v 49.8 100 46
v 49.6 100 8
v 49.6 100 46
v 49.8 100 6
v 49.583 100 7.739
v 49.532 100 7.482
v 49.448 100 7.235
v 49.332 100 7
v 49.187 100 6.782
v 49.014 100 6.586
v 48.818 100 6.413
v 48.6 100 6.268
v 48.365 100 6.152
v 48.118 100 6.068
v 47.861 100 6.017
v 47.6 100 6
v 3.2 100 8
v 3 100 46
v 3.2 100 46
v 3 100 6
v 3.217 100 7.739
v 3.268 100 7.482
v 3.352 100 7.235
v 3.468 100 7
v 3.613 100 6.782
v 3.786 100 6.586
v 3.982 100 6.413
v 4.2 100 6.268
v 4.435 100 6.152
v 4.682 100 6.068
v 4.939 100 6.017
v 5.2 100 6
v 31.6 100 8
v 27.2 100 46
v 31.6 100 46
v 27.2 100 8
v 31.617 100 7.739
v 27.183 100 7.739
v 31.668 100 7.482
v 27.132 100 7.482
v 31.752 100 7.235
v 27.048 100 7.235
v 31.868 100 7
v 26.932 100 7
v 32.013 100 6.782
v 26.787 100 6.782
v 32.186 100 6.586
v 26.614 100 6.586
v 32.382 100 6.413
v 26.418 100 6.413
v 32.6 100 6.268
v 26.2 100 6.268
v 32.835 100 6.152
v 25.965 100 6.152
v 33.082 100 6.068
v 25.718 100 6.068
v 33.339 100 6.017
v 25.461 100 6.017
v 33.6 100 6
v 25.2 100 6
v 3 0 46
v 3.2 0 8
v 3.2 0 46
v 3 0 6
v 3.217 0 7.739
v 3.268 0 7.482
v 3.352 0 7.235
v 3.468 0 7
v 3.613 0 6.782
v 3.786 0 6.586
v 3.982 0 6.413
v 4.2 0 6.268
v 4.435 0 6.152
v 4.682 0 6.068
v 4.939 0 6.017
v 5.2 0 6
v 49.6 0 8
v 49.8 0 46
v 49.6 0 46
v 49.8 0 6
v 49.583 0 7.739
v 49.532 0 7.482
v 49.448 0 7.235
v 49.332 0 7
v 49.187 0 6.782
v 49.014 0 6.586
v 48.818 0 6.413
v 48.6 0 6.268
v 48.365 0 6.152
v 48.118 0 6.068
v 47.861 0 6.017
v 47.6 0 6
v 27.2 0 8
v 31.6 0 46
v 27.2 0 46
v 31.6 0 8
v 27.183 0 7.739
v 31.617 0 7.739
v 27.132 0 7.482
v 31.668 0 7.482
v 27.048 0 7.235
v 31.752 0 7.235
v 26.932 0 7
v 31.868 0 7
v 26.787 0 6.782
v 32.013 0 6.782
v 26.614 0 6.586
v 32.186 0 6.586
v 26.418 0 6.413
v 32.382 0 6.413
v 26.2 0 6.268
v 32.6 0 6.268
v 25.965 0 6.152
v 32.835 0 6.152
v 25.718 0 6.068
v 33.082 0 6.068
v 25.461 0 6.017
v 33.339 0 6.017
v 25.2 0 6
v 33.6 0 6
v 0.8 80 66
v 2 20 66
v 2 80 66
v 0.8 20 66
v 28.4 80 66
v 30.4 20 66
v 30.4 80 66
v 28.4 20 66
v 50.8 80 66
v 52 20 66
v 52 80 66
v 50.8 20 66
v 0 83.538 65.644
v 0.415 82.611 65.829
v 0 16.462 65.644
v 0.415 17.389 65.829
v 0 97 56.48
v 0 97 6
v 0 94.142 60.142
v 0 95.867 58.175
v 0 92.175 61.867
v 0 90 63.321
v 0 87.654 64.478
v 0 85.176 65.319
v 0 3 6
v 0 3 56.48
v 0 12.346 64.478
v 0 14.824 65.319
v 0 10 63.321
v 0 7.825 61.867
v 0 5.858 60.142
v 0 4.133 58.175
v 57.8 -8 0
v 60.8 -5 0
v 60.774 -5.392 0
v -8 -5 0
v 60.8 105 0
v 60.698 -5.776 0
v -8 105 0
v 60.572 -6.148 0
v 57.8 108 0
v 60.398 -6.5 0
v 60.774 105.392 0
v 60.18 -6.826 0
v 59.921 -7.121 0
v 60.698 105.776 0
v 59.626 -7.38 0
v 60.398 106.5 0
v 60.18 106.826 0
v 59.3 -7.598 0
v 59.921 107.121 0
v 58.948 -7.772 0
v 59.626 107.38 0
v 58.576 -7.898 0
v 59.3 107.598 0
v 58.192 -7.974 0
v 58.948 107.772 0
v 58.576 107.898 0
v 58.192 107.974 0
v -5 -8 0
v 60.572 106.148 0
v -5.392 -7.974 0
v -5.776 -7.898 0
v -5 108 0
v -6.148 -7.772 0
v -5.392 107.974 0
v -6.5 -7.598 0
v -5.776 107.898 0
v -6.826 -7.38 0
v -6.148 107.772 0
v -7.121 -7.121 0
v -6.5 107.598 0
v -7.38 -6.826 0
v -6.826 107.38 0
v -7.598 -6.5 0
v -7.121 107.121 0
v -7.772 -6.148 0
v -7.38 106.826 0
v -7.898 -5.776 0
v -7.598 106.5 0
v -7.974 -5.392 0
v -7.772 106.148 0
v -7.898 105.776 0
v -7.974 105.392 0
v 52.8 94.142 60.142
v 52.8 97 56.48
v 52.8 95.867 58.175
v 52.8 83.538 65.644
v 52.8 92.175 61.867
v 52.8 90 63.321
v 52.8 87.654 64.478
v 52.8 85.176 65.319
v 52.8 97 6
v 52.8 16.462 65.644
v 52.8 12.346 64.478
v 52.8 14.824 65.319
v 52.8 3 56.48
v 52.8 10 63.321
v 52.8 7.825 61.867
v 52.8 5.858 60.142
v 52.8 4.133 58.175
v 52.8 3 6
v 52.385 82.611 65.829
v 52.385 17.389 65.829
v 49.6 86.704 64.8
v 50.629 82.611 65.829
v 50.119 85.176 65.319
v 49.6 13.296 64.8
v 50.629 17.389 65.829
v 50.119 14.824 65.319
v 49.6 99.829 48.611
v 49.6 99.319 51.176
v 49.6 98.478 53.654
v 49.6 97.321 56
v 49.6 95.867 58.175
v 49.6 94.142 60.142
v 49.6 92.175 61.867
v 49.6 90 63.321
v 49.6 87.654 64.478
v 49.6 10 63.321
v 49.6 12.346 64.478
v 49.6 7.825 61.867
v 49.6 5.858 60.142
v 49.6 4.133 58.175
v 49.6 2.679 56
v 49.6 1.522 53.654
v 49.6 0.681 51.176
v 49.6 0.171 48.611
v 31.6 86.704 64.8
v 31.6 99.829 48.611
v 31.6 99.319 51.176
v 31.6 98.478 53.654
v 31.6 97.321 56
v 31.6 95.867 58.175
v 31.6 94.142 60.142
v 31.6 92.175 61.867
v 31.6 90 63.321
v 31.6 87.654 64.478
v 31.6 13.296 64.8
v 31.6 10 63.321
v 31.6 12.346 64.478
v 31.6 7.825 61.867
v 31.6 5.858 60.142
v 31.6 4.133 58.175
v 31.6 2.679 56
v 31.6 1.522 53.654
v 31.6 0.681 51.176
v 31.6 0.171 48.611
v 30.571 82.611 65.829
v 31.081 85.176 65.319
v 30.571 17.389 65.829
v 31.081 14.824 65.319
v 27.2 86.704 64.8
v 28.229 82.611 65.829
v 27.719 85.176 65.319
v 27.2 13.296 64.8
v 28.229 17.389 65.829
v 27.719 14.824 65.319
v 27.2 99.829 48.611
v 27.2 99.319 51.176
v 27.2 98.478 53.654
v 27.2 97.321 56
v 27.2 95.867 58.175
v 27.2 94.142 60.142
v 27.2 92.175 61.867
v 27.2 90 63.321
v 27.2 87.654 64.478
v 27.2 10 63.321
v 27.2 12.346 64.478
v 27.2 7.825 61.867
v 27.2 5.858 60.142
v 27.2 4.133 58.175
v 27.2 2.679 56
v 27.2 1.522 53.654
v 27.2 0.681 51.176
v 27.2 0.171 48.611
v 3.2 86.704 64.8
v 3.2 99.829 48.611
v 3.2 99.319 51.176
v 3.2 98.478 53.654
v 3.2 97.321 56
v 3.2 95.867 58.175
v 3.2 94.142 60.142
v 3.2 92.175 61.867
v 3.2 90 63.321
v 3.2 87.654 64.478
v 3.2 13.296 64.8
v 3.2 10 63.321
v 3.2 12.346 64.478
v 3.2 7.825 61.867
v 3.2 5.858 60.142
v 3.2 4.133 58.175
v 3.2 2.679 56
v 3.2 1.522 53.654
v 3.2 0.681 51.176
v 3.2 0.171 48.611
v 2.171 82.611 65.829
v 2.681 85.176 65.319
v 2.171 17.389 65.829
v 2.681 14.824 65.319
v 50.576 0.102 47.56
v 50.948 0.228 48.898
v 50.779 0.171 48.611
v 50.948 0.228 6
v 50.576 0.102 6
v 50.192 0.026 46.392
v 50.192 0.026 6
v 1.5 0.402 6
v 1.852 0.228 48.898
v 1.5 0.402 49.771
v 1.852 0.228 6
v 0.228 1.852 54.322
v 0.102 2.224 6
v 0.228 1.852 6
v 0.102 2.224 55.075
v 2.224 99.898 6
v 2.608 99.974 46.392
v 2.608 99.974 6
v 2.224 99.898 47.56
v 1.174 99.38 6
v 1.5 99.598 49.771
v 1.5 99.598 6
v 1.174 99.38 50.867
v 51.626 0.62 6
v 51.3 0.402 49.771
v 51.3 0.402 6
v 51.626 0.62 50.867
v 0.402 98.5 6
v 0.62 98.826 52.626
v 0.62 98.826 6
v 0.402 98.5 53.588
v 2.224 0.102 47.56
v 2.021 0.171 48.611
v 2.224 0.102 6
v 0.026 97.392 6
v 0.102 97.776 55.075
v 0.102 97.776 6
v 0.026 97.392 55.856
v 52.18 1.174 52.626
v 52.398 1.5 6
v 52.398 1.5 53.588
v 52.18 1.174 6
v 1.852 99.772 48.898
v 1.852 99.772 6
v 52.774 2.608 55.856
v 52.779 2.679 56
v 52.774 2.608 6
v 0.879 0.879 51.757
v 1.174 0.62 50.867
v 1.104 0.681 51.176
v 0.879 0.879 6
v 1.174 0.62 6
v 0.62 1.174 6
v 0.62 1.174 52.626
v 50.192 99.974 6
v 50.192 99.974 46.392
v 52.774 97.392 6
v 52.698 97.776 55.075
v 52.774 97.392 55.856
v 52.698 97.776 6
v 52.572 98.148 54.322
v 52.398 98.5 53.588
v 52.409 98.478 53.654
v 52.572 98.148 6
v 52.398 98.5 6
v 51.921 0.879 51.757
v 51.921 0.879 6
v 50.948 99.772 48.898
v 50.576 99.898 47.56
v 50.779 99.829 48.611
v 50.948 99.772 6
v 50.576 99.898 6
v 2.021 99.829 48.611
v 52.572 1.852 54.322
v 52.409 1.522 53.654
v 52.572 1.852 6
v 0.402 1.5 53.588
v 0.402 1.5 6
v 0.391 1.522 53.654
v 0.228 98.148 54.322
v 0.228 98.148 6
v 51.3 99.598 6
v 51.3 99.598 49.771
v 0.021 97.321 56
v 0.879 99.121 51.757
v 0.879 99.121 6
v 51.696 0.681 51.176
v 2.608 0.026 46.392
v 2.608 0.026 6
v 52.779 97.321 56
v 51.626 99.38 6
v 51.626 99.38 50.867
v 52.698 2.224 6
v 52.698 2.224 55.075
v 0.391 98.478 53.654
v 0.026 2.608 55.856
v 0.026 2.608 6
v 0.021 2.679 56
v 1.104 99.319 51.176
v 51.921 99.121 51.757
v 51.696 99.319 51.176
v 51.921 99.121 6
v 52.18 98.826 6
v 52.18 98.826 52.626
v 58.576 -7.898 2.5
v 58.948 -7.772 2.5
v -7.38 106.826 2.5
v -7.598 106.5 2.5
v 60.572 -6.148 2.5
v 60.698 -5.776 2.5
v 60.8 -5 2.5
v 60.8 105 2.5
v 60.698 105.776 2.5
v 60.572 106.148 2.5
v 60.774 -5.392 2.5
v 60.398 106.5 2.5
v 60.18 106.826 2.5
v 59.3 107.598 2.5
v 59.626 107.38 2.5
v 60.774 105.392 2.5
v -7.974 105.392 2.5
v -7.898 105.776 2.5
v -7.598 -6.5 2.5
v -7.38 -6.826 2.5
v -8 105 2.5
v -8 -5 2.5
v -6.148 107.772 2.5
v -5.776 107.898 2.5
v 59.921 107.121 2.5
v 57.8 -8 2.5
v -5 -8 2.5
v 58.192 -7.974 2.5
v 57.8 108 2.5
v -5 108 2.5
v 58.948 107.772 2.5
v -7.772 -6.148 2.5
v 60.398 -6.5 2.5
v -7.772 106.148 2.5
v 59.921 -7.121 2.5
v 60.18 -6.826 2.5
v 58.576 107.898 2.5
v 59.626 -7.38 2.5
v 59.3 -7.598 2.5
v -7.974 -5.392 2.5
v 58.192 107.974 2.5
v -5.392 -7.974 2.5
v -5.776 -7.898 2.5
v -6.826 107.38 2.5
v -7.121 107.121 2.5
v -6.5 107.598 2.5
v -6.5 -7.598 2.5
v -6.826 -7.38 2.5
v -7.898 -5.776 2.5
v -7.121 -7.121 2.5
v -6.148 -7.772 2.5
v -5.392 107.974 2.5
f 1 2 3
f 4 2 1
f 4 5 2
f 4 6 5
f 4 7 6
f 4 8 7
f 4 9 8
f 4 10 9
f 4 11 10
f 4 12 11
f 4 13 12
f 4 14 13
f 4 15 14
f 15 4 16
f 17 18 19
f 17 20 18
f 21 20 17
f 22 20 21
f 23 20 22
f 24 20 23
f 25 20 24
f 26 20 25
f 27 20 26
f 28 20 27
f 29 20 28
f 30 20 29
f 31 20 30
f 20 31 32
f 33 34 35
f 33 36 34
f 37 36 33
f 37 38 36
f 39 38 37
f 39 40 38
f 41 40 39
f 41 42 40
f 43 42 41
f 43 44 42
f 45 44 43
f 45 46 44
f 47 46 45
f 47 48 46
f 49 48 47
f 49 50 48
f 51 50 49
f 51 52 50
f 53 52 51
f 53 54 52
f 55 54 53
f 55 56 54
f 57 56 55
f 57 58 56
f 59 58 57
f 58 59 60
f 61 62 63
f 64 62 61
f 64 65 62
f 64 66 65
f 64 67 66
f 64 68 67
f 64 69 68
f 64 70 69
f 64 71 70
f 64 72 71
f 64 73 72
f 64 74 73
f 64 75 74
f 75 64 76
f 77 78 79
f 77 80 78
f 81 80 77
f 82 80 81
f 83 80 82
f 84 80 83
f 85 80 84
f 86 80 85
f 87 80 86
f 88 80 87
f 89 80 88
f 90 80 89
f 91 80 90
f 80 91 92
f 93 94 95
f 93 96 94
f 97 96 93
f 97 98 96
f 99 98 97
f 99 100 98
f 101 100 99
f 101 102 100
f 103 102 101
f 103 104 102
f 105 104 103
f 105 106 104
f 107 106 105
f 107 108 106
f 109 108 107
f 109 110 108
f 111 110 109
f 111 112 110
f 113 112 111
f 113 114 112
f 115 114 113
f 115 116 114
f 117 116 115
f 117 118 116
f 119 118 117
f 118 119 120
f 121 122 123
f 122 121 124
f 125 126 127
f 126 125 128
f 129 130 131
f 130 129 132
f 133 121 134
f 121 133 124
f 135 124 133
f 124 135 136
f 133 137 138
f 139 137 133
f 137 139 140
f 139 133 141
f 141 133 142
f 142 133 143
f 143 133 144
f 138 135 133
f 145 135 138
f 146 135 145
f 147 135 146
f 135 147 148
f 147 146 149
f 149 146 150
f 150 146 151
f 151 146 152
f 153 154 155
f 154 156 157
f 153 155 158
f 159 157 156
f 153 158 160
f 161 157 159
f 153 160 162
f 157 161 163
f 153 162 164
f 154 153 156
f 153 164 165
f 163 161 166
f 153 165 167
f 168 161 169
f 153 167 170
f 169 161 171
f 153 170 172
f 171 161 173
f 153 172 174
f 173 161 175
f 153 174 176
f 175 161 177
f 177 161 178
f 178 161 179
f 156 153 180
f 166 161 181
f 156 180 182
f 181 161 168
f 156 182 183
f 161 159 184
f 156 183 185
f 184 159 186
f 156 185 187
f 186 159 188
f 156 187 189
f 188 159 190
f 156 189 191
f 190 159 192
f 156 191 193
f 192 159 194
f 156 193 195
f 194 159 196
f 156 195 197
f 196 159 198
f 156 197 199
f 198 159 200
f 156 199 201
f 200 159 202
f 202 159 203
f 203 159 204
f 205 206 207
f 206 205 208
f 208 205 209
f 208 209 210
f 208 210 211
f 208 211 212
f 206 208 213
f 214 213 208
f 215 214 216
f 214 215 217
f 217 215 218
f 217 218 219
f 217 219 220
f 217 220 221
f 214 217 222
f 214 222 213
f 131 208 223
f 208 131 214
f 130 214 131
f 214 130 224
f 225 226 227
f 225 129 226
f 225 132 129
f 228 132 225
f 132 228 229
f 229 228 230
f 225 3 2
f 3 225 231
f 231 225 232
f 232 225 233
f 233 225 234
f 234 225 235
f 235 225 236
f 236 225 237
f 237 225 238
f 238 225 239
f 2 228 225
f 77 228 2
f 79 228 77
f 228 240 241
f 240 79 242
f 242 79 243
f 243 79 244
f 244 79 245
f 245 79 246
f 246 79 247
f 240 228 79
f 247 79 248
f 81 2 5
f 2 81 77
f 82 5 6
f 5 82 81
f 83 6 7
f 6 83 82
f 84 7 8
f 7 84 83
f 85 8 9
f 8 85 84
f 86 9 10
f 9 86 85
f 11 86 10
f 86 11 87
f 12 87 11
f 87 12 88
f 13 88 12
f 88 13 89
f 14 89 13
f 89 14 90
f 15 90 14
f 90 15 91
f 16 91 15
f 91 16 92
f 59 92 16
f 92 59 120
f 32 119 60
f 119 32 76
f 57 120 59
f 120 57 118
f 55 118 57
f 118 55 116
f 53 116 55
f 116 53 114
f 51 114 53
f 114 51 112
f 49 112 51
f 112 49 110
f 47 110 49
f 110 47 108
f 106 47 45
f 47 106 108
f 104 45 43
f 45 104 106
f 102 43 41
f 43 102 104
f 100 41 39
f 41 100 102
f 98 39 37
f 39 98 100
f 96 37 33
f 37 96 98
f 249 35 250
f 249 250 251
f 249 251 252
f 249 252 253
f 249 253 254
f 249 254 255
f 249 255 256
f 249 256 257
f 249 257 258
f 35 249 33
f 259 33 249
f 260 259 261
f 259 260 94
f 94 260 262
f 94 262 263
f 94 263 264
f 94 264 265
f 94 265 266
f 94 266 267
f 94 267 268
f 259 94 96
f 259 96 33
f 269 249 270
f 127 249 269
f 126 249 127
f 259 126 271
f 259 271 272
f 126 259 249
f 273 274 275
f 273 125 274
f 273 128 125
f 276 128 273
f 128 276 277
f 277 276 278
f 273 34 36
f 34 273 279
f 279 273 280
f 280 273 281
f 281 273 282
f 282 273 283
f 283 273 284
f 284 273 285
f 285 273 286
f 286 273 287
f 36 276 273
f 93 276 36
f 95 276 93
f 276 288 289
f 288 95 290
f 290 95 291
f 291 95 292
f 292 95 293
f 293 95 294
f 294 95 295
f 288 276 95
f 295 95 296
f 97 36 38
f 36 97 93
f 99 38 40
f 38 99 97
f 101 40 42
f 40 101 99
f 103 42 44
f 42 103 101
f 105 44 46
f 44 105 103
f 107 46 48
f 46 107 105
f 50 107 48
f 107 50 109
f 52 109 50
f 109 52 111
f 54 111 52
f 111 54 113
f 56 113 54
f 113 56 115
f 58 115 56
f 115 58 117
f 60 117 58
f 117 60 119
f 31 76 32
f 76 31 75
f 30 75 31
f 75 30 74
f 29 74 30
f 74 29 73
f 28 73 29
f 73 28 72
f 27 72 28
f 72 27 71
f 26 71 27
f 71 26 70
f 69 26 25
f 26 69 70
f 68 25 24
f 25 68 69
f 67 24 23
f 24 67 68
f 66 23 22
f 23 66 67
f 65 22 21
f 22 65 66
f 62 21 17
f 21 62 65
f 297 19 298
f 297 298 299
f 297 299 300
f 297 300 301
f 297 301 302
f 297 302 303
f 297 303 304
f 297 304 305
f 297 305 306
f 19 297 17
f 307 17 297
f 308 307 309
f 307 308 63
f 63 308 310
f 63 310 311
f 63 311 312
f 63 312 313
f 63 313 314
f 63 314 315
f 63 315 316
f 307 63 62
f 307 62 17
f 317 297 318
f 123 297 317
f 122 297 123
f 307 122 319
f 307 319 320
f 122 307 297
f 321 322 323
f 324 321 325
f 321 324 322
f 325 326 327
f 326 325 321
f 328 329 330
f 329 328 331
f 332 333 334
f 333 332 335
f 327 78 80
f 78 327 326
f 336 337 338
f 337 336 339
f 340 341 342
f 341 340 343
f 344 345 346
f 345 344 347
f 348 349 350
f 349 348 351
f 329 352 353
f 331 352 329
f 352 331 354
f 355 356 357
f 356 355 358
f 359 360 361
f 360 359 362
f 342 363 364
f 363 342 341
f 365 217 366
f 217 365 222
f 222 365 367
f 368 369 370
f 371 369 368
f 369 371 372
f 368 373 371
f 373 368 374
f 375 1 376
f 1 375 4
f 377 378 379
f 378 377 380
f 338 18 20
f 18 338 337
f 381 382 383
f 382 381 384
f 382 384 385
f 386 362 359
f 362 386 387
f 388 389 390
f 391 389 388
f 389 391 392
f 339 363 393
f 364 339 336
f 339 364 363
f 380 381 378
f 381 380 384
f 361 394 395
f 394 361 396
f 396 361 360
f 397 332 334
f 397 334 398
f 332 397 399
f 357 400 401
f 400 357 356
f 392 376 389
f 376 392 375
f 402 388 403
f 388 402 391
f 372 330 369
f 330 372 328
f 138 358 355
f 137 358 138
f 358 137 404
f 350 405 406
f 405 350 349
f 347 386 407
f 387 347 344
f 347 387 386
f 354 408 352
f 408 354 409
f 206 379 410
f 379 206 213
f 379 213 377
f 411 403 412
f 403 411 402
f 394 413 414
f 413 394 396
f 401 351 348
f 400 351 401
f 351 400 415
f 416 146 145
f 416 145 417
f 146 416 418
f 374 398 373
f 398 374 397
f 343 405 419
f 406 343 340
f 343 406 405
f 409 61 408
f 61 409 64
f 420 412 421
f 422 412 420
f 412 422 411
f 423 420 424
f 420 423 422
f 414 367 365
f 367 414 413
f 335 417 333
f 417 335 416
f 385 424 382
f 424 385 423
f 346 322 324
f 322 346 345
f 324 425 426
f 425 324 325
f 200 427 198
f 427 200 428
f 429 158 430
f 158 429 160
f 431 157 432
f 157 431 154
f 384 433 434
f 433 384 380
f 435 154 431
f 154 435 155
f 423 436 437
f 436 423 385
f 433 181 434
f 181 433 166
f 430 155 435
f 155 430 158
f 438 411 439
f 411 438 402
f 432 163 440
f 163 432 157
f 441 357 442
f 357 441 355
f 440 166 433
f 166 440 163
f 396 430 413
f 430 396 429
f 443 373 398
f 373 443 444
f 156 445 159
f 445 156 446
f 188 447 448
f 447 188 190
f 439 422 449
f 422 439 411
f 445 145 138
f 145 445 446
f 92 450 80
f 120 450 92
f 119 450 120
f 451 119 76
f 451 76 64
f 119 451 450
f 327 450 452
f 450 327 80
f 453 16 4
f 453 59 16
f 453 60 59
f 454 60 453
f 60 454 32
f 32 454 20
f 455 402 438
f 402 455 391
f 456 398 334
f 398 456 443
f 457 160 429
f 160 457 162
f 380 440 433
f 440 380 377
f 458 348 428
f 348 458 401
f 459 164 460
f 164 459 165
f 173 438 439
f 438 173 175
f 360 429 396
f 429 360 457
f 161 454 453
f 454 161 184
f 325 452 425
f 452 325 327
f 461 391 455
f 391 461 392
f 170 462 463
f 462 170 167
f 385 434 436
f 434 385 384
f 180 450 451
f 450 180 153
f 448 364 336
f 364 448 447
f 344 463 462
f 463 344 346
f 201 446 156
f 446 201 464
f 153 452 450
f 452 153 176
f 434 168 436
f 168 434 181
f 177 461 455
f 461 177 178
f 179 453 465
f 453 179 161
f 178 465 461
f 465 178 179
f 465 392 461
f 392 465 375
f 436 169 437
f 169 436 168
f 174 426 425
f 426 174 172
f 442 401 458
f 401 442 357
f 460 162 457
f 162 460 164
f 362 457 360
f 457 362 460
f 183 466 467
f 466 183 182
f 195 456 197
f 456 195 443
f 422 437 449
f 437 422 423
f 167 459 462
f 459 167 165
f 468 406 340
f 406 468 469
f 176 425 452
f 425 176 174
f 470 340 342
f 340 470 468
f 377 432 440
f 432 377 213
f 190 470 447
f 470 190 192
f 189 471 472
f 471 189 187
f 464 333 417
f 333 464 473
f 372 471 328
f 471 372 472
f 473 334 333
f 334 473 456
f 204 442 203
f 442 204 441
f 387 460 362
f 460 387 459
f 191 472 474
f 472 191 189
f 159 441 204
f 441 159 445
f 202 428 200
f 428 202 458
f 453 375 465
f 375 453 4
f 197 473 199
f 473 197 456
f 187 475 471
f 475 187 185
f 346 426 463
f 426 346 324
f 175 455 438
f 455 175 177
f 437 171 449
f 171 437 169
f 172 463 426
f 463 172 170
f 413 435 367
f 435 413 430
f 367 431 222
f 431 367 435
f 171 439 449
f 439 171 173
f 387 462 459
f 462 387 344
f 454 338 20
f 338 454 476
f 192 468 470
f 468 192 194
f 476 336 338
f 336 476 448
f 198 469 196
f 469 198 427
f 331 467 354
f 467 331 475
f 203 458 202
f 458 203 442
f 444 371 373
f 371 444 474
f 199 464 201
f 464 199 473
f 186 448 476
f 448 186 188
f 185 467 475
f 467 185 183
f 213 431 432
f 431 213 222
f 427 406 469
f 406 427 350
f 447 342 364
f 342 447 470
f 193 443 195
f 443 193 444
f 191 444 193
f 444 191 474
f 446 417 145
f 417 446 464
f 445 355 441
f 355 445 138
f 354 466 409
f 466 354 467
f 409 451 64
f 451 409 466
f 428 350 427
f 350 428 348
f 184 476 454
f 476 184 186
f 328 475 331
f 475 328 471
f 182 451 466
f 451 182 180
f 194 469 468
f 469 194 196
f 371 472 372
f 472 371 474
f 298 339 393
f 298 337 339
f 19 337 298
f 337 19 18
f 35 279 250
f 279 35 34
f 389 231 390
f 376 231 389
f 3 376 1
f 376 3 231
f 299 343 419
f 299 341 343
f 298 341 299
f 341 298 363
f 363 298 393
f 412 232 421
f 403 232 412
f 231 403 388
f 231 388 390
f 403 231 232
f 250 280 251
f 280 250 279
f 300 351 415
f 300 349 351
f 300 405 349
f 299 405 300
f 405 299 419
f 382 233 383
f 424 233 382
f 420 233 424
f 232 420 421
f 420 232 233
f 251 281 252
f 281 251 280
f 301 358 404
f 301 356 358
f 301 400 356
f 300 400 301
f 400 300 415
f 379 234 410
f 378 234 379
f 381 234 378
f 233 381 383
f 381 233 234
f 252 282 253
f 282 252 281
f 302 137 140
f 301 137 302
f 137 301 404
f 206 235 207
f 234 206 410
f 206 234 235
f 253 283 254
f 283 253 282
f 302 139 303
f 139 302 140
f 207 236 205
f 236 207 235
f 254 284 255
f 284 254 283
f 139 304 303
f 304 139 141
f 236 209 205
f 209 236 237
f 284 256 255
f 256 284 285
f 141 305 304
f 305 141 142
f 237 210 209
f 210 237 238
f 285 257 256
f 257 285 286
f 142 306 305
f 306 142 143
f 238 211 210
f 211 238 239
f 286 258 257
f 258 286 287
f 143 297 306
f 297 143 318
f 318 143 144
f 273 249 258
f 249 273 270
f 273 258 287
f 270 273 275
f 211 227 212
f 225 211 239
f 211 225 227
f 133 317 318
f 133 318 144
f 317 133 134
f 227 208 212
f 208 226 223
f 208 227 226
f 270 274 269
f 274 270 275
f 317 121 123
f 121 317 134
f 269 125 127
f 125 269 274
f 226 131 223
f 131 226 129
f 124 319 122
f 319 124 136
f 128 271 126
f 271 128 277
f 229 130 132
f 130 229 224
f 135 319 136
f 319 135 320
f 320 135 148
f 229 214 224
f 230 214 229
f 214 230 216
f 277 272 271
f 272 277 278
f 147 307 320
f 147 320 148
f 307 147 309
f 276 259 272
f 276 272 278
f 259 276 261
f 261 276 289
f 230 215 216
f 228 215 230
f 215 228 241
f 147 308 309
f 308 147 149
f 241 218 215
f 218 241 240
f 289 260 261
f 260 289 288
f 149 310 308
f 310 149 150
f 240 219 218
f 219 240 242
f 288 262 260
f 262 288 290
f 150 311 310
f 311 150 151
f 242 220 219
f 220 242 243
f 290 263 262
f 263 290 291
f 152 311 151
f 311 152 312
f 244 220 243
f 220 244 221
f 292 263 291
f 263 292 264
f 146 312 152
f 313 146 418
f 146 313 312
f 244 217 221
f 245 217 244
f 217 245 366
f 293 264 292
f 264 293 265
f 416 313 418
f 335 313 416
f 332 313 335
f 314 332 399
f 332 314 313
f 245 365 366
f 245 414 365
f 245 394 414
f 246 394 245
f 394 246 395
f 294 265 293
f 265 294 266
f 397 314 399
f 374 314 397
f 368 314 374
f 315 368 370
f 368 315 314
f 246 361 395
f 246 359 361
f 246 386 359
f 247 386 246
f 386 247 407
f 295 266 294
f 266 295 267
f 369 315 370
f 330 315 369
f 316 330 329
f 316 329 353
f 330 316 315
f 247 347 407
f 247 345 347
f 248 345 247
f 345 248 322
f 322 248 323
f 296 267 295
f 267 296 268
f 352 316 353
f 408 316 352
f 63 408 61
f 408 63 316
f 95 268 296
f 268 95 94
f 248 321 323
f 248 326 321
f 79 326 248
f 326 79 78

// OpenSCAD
// Vertikaler Laptop-/Tablet-Ständer, 2 Schlitze in einem Teil
// Alle Maße in Millimetern (Regel: units-mm)
//
// Änderungen gegenüber 002 (Nutzerwunsch: weniger klobig, kürzer):
//   - Obere Ecken der Rippen gerundet (top_r). Das ist rein optisch, nimmt
//     der Silhouette die Klotzigkeit und kostet nur ~2 cm³ Material.
//   - Körper 130 -> 100 mm kurz. Damit die Längsstabilität dabei NICHT
//     mitschrumpft, steht die Fußleiste jetzt auch nach vorn und hinten
//     über (foot_flare_y). Aufstandstiefe 116 mm bei nur 100 mm sichtbarem
//     Körper -> der erlaubte Längsversatz bleibt praktisch gleich, das Teil
//     wirkt aber deutlich kürzer.
//
// Änderungen in 002 gegenüber 001 (Statik nachgerechnet, siehe Lastfälle):
//   - Fußleiste: unten 8 mm pro Seite Überstand, nach oben auf Körperbreite
//     auslaufend. Aufstandsbreite 68.8 mm, der Körper bleibt oben 52.8 mm.
//     Grund: der kritische Lastfall ist NICHT die Rippenfestigkeit, sondern
//     Kippen. Nur die Aufstandsbreite hilft dagegen nennenswert.
//   - base_d 110 -> 130 mm gegen Kippen in Längsrichtung.
//   - floor_t 5 -> 6 mm. Der Sockel ist jetzt die Fußleiste, die äußere
//     Lippe soll nicht zu dünn auslaufen.
//
// Kontext (Regel: context-first), Stand bei Erstellung:
//   - context/printer.md:    Anycubic Kobra S1, 0.4mm Düse, PEI, 250mm Bauraum
//   - context/tolerances.md: eff. XY-Fehler ~0.15–0.2mm/Seite. Hier irrelevant
//                            für die Funktion (kein Passsitz), aber er macht
//                            die Schlitze real ~0.3–0.4mm schmaler als nominal
//                            -> im Puffer unten schon berücksichtigt.
//   - context/materials.md:  noch leer -> PLA angenommen
//
// Anforderungen aus dem Design-Dialog:
//   - Laptop 20mm dick, "ein wenig Puffer" -> 2.0mm Luft pro Seite
//   - iPad 15mm dick (mit Hülle)           -> 1.5mm Luft pro Seite
//   - Ein Teil, beide Schlitze nebeneinander
//   - Geräte stehen senkrecht, straff geführt (keine Neigung)
//   - Minimalistisch und schmal: auf dem Schreibtisch ist wenig Breite frei
//   - Nachgereicht: Kippsicherheit wichtiger als die letzten 16mm Breite,
//     solange der Körper oben schmal bleibt
//
// Aufbau / Prinzip:
//   Eine Fußleiste (foot_h hoch, ringsum überstehend) trägt den Sockel mit
//   drei aufstehenden Rippen. Dazwischen die beiden Schlitze. Die Schlitze
//   laufen in Y komplett durch (vorne und hinten offen) – das spart
//   Material, macht das Teil leichter zu reinigen und erlaubt es, den Laptop
//   von jeder Seite einzuschieben.
//
//   Der Fuß steht in ALLE vier Richtungen über, nicht nur seitlich. Das ist
//   der Trick, mit dem der Körper kurz sein darf: die Kippkanten liegen
//   trotzdem weit außen. Optisch zählt die Länge der Rippen (100 mm), für
//   die Statik zählt die Aufstandsfläche (116 mm).
//
//   Die schmale Seite (X) zeigt zum Nutzer, die lange Seite (Y, base_d) geht
//   in die Tischtiefe. Der Laptop steht also mit seiner Breitseite (~31cm)
//   in Y -> auf dem Tisch verbraucht der Ständer nur ~7cm Breite.
//
//   Schlitzmund und obere Außenkanten sind angefast (mouth_c/edge_c), der
//   Schlitzgrund hat eine Hohlkehle (fillet_r).
//
// ---------------------------------------------------------------------------
// LASTFÄLLE (nachgerechnet, nicht geschätzt)
// ---------------------------------------------------------------------------
//
// 1) Rippe auf Biegung – unkritisch, mit großem Abstand.
//    Rippe = einseitig eingespannter Balken, Länge wall_h, Querschnitt
//    base_d x wall_t. Die Biegespannung an der Wurzel wirkt in Z-Richtung,
//    also QUER zu den Layern -> maßgebend ist die Layerhaftung, konservativ
//    25 MPa (massives PLA hätte ~50).
//      Außenrippe 3.2mm: Bruch erst bei ~92 N Horizontalkraft an der
//                        Rippenoberkante (~9 kg).
//      Mittelrippe 4.4mm: ~175 N (~18 kg).
//    Real wirkt dort: der Laptop lehnt sich im Schlitzspiel (3.8°) an die
//    Rippe -> ~2.2 N, Durchbiegung ~0.12 mm. Sicherheitsfaktor ~40.
//    Das Eigengewicht (1.8kg senkrecht auf 24 x 130 mm Auflage) erzeugt
//    0.006 MPa Druckspannung – irrelevant.
//    -> Die Rippen sind nicht die Schwachstelle. Nicht dünner machen als
//       3.2/4.4, aber dicker bringt nichts außer Breite.
//
// 2) Kippen – das ist der kritische Lastfall.
//    Ungünstig ist NUR der Laptop im linken Schlitz: dann sitzt der
//    Schwerpunkt seitlich außermittig. Die echten Zahlen rechnet der
//    echo()-Block unten aus den aktuellen Parametern aus.
//    Mit 001 (52.8mm breit) warf ihn ein Schubs von ~130 g oben am Laptop
//    um. Mit der Fußleiste sind es ~200 g.
//    Ballast hilft kaum: 150 g Stahl mittig im Sockel bringen nur +14 %,
//    weil mittig eingebaute Masse den Hebelarm nicht verlängert.
//    Nur die Aufstandsbreite zählt.
//
// Druckausrichtung: So wie das Teil steht, Fußunterseite aufs Bett.
//   Keine Stützen nötig: die Schlitze öffnen nach oben, alle Fasen und die
//   Fußschräge sind nach oben gerichtete Flächen, es gibt keine Brücke und
//   keinen Überhang. Auch die Eckenrundung oben ist überhangfrei: sie nimmt
//   nach oben ab, jede Lage ist kleiner als die darunter.
//   Die plane 68.8 x 116mm Fläche auf PEI = sehr gute Haftung.
//   Empfehlung: Infill >= 30%. Layerrichtung: die Rippen werden liegend
//   aufgebaut, seitliche Belastung zieht quer zu den Layern – deshalb die
//   konservative Rechnung oben mit 25 MPa.
//
// Nach dem Druck: 4 Filzgleiter unter den Fuß kleben. Das schützt den Tisch
//   und verhindert, dass der Ständer beim Einschieben wegrutscht.
//
// Anpassen: Laptop dicker/dünner -> nur laptop_t ändern, alles andere
//   rechnet sich mit (auch die Kipp-Rechnung im echo()).

/* [Geräte] */
// Dicke des Laptops (gemessen, geschlossen)
laptop_t = 20;
// Luft pro Seite im Laptop-Schlitz
laptop_gap = 2.0;
// Dicke des iPads inkl. Hülle
ipad_t = 15;
// Luft pro Seite im iPad-Schlitz
ipad_gap = 1.5;
// Zweiten Schlitz überhaupt bauen
ipad_slot_on = true;

/* [Geräte-Annahmen für die Kipp-Rechnung] */
// Masse des Laptops in Gramm (14-Zoll-Klasse). Nur für echo(), nicht für
// die Geometrie – bei Bedarf mit dem echten Wert überschreiben.
laptop_mass_g = 1800;
// Höhe des geschlossenen Laptops, auf der Kante stehend
laptop_dev_h = 220;
// Masse des iPads inkl. Hülle in Gramm
ipad_mass_g = 700;
// Höhe des iPads, auf der Kante stehend
ipad_dev_h = 180;

/* [Ständer] */
// Wandstärke der beiden Außenrippen. Muss dicker sein als mouth_c + edge_c,
// sonst läuft die Rippe oben auf eine Schneide aus (siehe assert unten).
wall_t = 3.2;
// Wandstärke der Mittelrippe (trennt beide Schlitze, trägt von zwei Seiten)
mid_wall = 4.4;
// Höhe der Rippen über dem Schlitzgrund = Einstecktiefe des Geräts
wall_h = 60;
// Dicke des massiven Sockels unter den Schlitzen (= Höhe der Fußleiste)
floor_t = 6.0;
// Tiefe des sichtbaren Körpers (Y, in die Tischtiefe). Das ist das Maß, das
// das Teil "lang" aussehen lässt – die Standfestigkeit hängt am Fuß, nicht
// hieran.
base_d = 100;

/* [Fußleiste] */
// Überstand der Fußleiste pro Seite in X. Das ist der einzige wirksame
// Hebel gegen seitliches Kippen – siehe Lastfall 2 im Kopf.
foot_flare = 8.0;
// Überstand der Fußleiste nach vorn und hinten. Hält den erlaubten
// Längsversatz oben, obwohl der Körper kurz ist.
foot_flare_y = 8.0;
// Höhe der Fußleiste. Muss <= floor_t bleiben, sonst ragt sie in die
// Schlitze (siehe assert unten).
foot_h = 6.0;
// Davon der untere, senkrechte Teil. Der Rest läuft schräg nach oben auf
// Körperbreite aus. Nicht auf 0 setzen: die äußere Lippe würde sonst
// spitz auslaufen und beim ersten Anstoßen abbrechen.
foot_straight = 2.5;

/* [Kanten] */
// Fase am Schlitzmund (Einführhilfe – die funktionale Fase)
mouth_c = 1.2;
// Fase an den oberen Außenkanten (nur Optik/Haptik, deshalb kleiner:
// mouth_c + edge_c fressen sonst die Rippe oben komplett auf)
edge_c = 0.8;
// Hohlkehle am Schlitzgrund (Kerbspannung an der Rippenwurzel)
fillet_r = 2.0;
// Radius der senkrechten Außenkanten
corner_r = 3.0;
// Radius der oberen Ecken in der Seitenansicht (vorn und hinten oben).
// Rein optisch: nimmt der Silhouette die Klotzigkeit. 0 = eckig wie 002.
top_r = 20.0;

/* [Qualität] */
$fn = 48;

// ---------------------------------------------------------------------------
// Abgeleitete Maße
// ---------------------------------------------------------------------------

laptop_w = laptop_t + 2 * laptop_gap;   // lichte Schlitzbreite Laptop
ipad_w   = ipad_t   + 2 * ipad_gap;     // lichte Schlitzbreite iPad

// X-Positionen der Rippen-/Schlitzkanten, von links (0 = linke Körperkante)
x1 = wall_t;                                            // Laptop-Schlitz links
x2 = x1 + laptop_w;                                     // Laptop-Schlitz rechts
x3 = x2 + (ipad_slot_on ? mid_wall : 0);                // iPad-Schlitz links
x4 = x3 + (ipad_slot_on ? ipad_w : 0);                  // iPad-Schlitz rechts

total_w = x4 + wall_t;                  // Körperbreite oben
total_h = floor_t + wall_h;
foot_w  = total_w + 2 * foot_flare;     // Aufstandsbreite unten
foot_d  = base_d  + 2 * foot_flare_y;   // Aufstandstiefe unten

// ---------------------------------------------------------------------------
// Kipp-Rechnung: Schwerpunkt der Einheit Ständer + Gerät(e)
// ---------------------------------------------------------------------------
// Alle x-Werte ab der LINKEN KANTE DER AUFSTANDSFLÄCHE, damit die Abstände
// direkt die Hebelarme zur Kippkante sind. Der Körper beginnt also bei
// x = foot_flare.

// Eigenmasse, grob: Volumen mal PLA-Dichte mal effektive Füllung. Die Rippen
// drucken bei 3.2/4.4mm Wandstärke praktisch massiv, der Sockel nicht ->
// ~0.6 im Mittel. Nur für die Rechnung, nicht kritisch.
rib_t      = 2 * wall_t + (ipad_slot_on ? mid_wall : 0);   // Summe der Rippendicken
vol_body   = total_w * base_d * floor_t + rib_t * base_d * wall_h;
// Fuß: Ring um den Körper, im Mittel auf halber Schrägenhöhe
foot_mid_h = foot_straight + (foot_h - foot_straight) / 2;
vol_foot   = (foot_w * foot_d - total_w * base_d) * foot_mid_h;
// Was die Eckenrundung oben wegnimmt: pro Ecke r^2 * (1 - pi/4), zwei Ecken,
// über die Summe der Rippendicken.
vol_round  = 2 * top_r * top_r * (1 - PI/4) * rib_t;
stand_g    = (vol_body + vol_foot - vol_round) * 1.24e-3 * 0.6;

x_laptop   = foot_flare + x1 + laptop_w / 2;   // Schlitzmitte Laptop
x_ipad     = foot_flare + x3 + ipad_w / 2;     // Schlitzmitte iPad

// Schwerpunkt für eine Lastkombination. Rückgabe: [Masse, x, z]
function cog(ms, xs, zs) =
    let (M = ms[0] + ms[1] + ms[2])
    [ M,
      (ms[0]*xs[0] + ms[1]*xs[1] + ms[2]*xs[2]) / M,
      (ms[0]*zs[0] + ms[1]*zs[1] + ms[2]*zs[2]) / M ];

// Kippwinkel = atan(Hebelarm zur nächsten Kippkante / Schwerpunkthöhe)
function tip_angle(c) = atan(min(c[1], foot_w - c[1]) / c[2]);
// Horizontalkraft oben am Gerät, die zum Umkippen reicht, in Gramm-Äquivalent
function tip_push_g(c, push_h) = c[0] * min(c[1], foot_w - c[1]) / push_h;

c_lap  = cog([stand_g, laptop_mass_g, 0],
             [foot_w/2, x_laptop, 0],
             [floor_t * 0.9, floor_t + laptop_dev_h/2, 0]);
c_both = cog([stand_g, laptop_mass_g, ipad_mass_g],
             [foot_w/2, x_laptop, x_ipad],
             [floor_t * 0.9, floor_t + laptop_dev_h/2, floor_t + ipad_dev_h/2]);

// Längskippen: wie weit darf der Laptop in Y aus der Mitte stehen. Maßgebend
// ist die Aufstandstiefe des Fußes, nicht die Körpertiefe.
y_off_max = (foot_d / 2) * c_lap[0] / laptop_mass_g;

// Spiel des Geräts im Schlitz: um so viel Grad kann es im Schlitz kippeln
play_deg_l = atan(2 * laptop_gap / wall_h);
play_deg_i = atan(2 * ipad_gap / wall_h);

// Rippenfestigkeit (Lastfall 1): Bruchkraft an der Rippenoberkante.
// W = Widerstandsmoment des Rippenquerschnitts, sigma_z = Layerhaftung.
sigma_z   = 25;    // MPa, konservativ für PLA quer zu den Layern
f_break_o = sigma_z * (base_d * wall_t   * wall_t   / 6) / wall_h;
f_break_m = sigma_z * (base_d * mid_wall * mid_wall / 6) / wall_h;

// ---------------------------------------------------------------------------
// Prüfungen (Regel: printability-report – wird gemeldet, nicht stillschweigend
// korrigiert)
// ---------------------------------------------------------------------------

nozzle_d = 0.4;

// Restbreite der Rippen ganz oben, nachdem die Fasen abgezogen sind. Das ist
// die kritische Größe: läuft eine Rippe oben auf eine Schneide aus, kann der
// Drucker die letzten Layer nicht mehr sauber legen und die Kante wird
// ausgefranst und bröselig.
outer_top_w = wall_t   - mouth_c - edge_c;
mid_top_w   = mid_wall - 2 * mouth_c;

assert(wall_t   >= 2 * nozzle_d, "wall_t unter 2x Duesendurchmesser");
assert(mid_wall >= 2 * nozzle_d, "mid_wall unter 2x Duesendurchmesser");
assert(floor_t  >= 2 * nozzle_d, "floor_t unter 2x Duesendurchmesser");
assert(fillet_r <= wall_h,       "fillet_r groesser als die Rippenhoehe");
assert(outer_top_w >= 2 * nozzle_d,
       "Aussenrippe laeuft oben spitz zu: wall_t erhoehen oder Fasen kleiner");
assert(!ipad_slot_on || mid_top_w >= 2 * nozzle_d,
       "Mittelrippe laeuft oben spitz zu: mid_wall erhoehen oder mouth_c kleiner");
assert(mouth_c * 2 < min(laptop_w, ipad_slot_on ? ipad_w : 1e9),
       "mouth_c zu gross - die Fasen fressen den Schlitz auf");
assert(foot_h <= floor_t,
       "foot_h groesser als floor_t - die Fussleiste ragt in die Schlitze");
assert(foot_straight > 0 && foot_straight <= foot_h,
       "foot_straight muss zwischen 0 und foot_h liegen");
assert(foot_straight >= 2 * nozzle_d,
       "Fusslippe laeuft spitz aus: foot_straight erhoehen");
assert(corner_r <= foot_w / 2 && corner_r <= base_d / 2,
       "corner_r groesser als das halbe Teil");
assert(top_r <= wall_h,
       "top_r groesser als die Rippenhoehe - die Rundung frisst den Sockel an");
assert(top_r <= base_d / 2,
       "top_r groesser als die halbe Koerpertiefe - die Rundungen ueberlappen");
assert(foot_w <= 250 && foot_d <= 250 && total_h <= 250,
       "passt nicht auf das Druckbett (250 x 250 x 250)");

echo(str("Koerper: ", total_w, " x ", base_d, " mm, Hoehe ", total_h, " mm"));
echo(str("Aufstandsflaeche (Fuss): ", foot_w, " x ", foot_d, " mm"));
echo(str("Schlitz Laptop: ", laptop_w, " mm lichte Weite fuer ", laptop_t, " mm Geraet"));
echo(str("Schlitz iPad:   ", ipad_slot_on ? ipad_w : 0, " mm lichte Weite fuer ", ipad_t, " mm Geraet"));
echo(str("Rippenbreite oben nach Fasen: aussen ", outer_top_w, " mm, mitte ", mid_top_w, " mm"));
echo(str("Staender-Eigenmasse (geschaetzt, 30% Infill): ", round(stand_g), " g"));
echo(str("Lastfall 1 Rippenbruch: aussen ", round(f_break_o), " N, mitte ",
         round(f_break_m), " N an der Rippenoberkante"));
echo(str("Lastfall 2 Kippen, NUR Laptop links: ", tip_angle(c_lap),
         " Grad, Schubs oben ", round(tip_push_g(c_lap, floor_t + laptop_dev_h)), " g"));
echo(str("Lastfall 2 Kippen, beide Geraete:    ", tip_angle(c_both),
         " Grad, Schubs oben ", round(tip_push_g(c_both, floor_t + laptop_dev_h)), " g"));
echo(str("Laengskippen: Laptop darf max ", round(y_off_max), " mm aus der Mitte stehen"));
echo(str("Kippeln im Schlitz: Laptop ", play_deg_l, " Grad, iPad ", play_deg_i, " Grad"));

// ---------------------------------------------------------------------------
// 2D-Querschnitt des Körpers (X = Breite, Y der 2D-Ebene = Höhe Z des Teils)
// ---------------------------------------------------------------------------

// Material, das in eine Innenecke des Schlitzgrunds zurückgelegt wird:
// Quadrat minus Kreis = Hohlkehle. dir = +1 linke Ecke, -1 rechte Ecke.
module fillet_piece(x, dir) {
    r = fillet_r;
    translate([x, floor_t])
        difference() {
            translate([dir > 0 ? 0 : -r, 0]) square([r, r]);
            translate([dir * r, r]) circle(r = r);
        }
}

// Schnittfigur eines Schlitzes: Rechteck nach oben offen + Trichter am Mund.
module slot_cut(a, b) {
    c = mouth_c;
    union() {
        translate([a, floor_t]) square([b - a, total_h - floor_t + 1]);
        polygon([
            [a,     total_h - c],
            [b,     total_h - c],
            [b + c, total_h    ],
            [b + c, total_h + 1],
            [a - c, total_h + 1],
            [a - c, total_h    ]
        ]);
    }
}

module profile() {
    c = edge_c;
    union() {
        difference() {
            square([total_w, total_h]);

            slot_cut(x1, x2);
            if (ipad_slot_on) slot_cut(x3, x4);

            // Fasen an den oberen Außenkanten
            polygon([[-1, total_h - c], [c, total_h],
                     [c, total_h + 1], [-1, total_h + 1]]);
            polygon([[total_w + 1, total_h - c], [total_w - c, total_h],
                     [total_w - c, total_h + 1], [total_w + 1, total_h + 1]]);
        }

        // Hohlkehlen am Schlitzgrund
        fillet_piece(x1,  1);
        fillet_piece(x2, -1);
        if (ipad_slot_on) {
            fillet_piece(x3,  1);
            fillet_piece(x4, -1);
        }
    }
}

// ---------------------------------------------------------------------------
// Körper
// ---------------------------------------------------------------------------

// Prisma mit gerundeten senkrechten Kanten, Ursprung linke vordere Ecke
module rounded_prism(w, d, h) {
    linear_extrude(height = h)
        offset(r = corner_r) offset(delta = -corner_r)
            square([w, d]);
}

// Der eigentliche Ständer, ohne Fuß. Sitzt bei x = 0 .. total_w.
module koerper() {
    intersection() {
        // Querschnitt entlang Y ausziehen
        rotate([90, 0, 0])
            translate([0, 0, -base_d])
                linear_extrude(height = base_d)
                    profile();

        translate([0, 0, -1]) rounded_prism(total_w, base_d, total_h + 2);
    }
}

// Fußleiste: unten foot_straight senkrecht auf voller Aufstandsfläche,
// darüber per hull() ringsum schräg auf den Körpergrundriss auslaufend.
// hull() zwischen den beiden Scheiben übernimmt automatisch die
// Eckenrundung beider Grundrisse.
module fuss() {
    eps = 0.01;
    hull() {
        translate([-foot_flare, -foot_flare_y, 0])
            rounded_prism(foot_w, foot_d, foot_straight);
        translate([0, 0, foot_h - eps])
            rounded_prism(total_w, base_d, eps);
    }
}

// Schnittmaske für die gerundeten oberen Ecken in der Seitenansicht.
// 2D in (Y, Z), danach nach X ausgezogen. Unten bewusst über den Fuß hinaus
// verbreitert, damit die Maske dort nichts abschneidet.
module top_round_mask() {
    m = foot_flare_y + 1;
    w = foot_w + 2;
    rotate([90, 0, 90])
        translate([0, 0, -foot_flare - 1])
            linear_extrude(height = w)
                union() {
                    offset(r = top_r) offset(delta = -top_r)
                        square([base_d, total_h]);
                    translate([-m, 0]) square([base_d + 2 * m, total_h - top_r]);
                }
}

module staender() {
    render(convexity = 10)
        intersection() {
            union() {
                koerper();
                fuss();
            }
            if (top_r > 0) top_round_mask();
            else translate([-foot_flare - 1, -foot_flare_y - 1, -1])
                     cube([foot_w + 2, foot_d + 2, total_h + 2]);
        }
}

// Auf false setzen (oder per CLI -D render_part=false), wenn die Datei nur
// als Modulquelle für Schnitt-/Prüfskripte eingebunden wird.
render_part = true;
if (render_part) staender();
